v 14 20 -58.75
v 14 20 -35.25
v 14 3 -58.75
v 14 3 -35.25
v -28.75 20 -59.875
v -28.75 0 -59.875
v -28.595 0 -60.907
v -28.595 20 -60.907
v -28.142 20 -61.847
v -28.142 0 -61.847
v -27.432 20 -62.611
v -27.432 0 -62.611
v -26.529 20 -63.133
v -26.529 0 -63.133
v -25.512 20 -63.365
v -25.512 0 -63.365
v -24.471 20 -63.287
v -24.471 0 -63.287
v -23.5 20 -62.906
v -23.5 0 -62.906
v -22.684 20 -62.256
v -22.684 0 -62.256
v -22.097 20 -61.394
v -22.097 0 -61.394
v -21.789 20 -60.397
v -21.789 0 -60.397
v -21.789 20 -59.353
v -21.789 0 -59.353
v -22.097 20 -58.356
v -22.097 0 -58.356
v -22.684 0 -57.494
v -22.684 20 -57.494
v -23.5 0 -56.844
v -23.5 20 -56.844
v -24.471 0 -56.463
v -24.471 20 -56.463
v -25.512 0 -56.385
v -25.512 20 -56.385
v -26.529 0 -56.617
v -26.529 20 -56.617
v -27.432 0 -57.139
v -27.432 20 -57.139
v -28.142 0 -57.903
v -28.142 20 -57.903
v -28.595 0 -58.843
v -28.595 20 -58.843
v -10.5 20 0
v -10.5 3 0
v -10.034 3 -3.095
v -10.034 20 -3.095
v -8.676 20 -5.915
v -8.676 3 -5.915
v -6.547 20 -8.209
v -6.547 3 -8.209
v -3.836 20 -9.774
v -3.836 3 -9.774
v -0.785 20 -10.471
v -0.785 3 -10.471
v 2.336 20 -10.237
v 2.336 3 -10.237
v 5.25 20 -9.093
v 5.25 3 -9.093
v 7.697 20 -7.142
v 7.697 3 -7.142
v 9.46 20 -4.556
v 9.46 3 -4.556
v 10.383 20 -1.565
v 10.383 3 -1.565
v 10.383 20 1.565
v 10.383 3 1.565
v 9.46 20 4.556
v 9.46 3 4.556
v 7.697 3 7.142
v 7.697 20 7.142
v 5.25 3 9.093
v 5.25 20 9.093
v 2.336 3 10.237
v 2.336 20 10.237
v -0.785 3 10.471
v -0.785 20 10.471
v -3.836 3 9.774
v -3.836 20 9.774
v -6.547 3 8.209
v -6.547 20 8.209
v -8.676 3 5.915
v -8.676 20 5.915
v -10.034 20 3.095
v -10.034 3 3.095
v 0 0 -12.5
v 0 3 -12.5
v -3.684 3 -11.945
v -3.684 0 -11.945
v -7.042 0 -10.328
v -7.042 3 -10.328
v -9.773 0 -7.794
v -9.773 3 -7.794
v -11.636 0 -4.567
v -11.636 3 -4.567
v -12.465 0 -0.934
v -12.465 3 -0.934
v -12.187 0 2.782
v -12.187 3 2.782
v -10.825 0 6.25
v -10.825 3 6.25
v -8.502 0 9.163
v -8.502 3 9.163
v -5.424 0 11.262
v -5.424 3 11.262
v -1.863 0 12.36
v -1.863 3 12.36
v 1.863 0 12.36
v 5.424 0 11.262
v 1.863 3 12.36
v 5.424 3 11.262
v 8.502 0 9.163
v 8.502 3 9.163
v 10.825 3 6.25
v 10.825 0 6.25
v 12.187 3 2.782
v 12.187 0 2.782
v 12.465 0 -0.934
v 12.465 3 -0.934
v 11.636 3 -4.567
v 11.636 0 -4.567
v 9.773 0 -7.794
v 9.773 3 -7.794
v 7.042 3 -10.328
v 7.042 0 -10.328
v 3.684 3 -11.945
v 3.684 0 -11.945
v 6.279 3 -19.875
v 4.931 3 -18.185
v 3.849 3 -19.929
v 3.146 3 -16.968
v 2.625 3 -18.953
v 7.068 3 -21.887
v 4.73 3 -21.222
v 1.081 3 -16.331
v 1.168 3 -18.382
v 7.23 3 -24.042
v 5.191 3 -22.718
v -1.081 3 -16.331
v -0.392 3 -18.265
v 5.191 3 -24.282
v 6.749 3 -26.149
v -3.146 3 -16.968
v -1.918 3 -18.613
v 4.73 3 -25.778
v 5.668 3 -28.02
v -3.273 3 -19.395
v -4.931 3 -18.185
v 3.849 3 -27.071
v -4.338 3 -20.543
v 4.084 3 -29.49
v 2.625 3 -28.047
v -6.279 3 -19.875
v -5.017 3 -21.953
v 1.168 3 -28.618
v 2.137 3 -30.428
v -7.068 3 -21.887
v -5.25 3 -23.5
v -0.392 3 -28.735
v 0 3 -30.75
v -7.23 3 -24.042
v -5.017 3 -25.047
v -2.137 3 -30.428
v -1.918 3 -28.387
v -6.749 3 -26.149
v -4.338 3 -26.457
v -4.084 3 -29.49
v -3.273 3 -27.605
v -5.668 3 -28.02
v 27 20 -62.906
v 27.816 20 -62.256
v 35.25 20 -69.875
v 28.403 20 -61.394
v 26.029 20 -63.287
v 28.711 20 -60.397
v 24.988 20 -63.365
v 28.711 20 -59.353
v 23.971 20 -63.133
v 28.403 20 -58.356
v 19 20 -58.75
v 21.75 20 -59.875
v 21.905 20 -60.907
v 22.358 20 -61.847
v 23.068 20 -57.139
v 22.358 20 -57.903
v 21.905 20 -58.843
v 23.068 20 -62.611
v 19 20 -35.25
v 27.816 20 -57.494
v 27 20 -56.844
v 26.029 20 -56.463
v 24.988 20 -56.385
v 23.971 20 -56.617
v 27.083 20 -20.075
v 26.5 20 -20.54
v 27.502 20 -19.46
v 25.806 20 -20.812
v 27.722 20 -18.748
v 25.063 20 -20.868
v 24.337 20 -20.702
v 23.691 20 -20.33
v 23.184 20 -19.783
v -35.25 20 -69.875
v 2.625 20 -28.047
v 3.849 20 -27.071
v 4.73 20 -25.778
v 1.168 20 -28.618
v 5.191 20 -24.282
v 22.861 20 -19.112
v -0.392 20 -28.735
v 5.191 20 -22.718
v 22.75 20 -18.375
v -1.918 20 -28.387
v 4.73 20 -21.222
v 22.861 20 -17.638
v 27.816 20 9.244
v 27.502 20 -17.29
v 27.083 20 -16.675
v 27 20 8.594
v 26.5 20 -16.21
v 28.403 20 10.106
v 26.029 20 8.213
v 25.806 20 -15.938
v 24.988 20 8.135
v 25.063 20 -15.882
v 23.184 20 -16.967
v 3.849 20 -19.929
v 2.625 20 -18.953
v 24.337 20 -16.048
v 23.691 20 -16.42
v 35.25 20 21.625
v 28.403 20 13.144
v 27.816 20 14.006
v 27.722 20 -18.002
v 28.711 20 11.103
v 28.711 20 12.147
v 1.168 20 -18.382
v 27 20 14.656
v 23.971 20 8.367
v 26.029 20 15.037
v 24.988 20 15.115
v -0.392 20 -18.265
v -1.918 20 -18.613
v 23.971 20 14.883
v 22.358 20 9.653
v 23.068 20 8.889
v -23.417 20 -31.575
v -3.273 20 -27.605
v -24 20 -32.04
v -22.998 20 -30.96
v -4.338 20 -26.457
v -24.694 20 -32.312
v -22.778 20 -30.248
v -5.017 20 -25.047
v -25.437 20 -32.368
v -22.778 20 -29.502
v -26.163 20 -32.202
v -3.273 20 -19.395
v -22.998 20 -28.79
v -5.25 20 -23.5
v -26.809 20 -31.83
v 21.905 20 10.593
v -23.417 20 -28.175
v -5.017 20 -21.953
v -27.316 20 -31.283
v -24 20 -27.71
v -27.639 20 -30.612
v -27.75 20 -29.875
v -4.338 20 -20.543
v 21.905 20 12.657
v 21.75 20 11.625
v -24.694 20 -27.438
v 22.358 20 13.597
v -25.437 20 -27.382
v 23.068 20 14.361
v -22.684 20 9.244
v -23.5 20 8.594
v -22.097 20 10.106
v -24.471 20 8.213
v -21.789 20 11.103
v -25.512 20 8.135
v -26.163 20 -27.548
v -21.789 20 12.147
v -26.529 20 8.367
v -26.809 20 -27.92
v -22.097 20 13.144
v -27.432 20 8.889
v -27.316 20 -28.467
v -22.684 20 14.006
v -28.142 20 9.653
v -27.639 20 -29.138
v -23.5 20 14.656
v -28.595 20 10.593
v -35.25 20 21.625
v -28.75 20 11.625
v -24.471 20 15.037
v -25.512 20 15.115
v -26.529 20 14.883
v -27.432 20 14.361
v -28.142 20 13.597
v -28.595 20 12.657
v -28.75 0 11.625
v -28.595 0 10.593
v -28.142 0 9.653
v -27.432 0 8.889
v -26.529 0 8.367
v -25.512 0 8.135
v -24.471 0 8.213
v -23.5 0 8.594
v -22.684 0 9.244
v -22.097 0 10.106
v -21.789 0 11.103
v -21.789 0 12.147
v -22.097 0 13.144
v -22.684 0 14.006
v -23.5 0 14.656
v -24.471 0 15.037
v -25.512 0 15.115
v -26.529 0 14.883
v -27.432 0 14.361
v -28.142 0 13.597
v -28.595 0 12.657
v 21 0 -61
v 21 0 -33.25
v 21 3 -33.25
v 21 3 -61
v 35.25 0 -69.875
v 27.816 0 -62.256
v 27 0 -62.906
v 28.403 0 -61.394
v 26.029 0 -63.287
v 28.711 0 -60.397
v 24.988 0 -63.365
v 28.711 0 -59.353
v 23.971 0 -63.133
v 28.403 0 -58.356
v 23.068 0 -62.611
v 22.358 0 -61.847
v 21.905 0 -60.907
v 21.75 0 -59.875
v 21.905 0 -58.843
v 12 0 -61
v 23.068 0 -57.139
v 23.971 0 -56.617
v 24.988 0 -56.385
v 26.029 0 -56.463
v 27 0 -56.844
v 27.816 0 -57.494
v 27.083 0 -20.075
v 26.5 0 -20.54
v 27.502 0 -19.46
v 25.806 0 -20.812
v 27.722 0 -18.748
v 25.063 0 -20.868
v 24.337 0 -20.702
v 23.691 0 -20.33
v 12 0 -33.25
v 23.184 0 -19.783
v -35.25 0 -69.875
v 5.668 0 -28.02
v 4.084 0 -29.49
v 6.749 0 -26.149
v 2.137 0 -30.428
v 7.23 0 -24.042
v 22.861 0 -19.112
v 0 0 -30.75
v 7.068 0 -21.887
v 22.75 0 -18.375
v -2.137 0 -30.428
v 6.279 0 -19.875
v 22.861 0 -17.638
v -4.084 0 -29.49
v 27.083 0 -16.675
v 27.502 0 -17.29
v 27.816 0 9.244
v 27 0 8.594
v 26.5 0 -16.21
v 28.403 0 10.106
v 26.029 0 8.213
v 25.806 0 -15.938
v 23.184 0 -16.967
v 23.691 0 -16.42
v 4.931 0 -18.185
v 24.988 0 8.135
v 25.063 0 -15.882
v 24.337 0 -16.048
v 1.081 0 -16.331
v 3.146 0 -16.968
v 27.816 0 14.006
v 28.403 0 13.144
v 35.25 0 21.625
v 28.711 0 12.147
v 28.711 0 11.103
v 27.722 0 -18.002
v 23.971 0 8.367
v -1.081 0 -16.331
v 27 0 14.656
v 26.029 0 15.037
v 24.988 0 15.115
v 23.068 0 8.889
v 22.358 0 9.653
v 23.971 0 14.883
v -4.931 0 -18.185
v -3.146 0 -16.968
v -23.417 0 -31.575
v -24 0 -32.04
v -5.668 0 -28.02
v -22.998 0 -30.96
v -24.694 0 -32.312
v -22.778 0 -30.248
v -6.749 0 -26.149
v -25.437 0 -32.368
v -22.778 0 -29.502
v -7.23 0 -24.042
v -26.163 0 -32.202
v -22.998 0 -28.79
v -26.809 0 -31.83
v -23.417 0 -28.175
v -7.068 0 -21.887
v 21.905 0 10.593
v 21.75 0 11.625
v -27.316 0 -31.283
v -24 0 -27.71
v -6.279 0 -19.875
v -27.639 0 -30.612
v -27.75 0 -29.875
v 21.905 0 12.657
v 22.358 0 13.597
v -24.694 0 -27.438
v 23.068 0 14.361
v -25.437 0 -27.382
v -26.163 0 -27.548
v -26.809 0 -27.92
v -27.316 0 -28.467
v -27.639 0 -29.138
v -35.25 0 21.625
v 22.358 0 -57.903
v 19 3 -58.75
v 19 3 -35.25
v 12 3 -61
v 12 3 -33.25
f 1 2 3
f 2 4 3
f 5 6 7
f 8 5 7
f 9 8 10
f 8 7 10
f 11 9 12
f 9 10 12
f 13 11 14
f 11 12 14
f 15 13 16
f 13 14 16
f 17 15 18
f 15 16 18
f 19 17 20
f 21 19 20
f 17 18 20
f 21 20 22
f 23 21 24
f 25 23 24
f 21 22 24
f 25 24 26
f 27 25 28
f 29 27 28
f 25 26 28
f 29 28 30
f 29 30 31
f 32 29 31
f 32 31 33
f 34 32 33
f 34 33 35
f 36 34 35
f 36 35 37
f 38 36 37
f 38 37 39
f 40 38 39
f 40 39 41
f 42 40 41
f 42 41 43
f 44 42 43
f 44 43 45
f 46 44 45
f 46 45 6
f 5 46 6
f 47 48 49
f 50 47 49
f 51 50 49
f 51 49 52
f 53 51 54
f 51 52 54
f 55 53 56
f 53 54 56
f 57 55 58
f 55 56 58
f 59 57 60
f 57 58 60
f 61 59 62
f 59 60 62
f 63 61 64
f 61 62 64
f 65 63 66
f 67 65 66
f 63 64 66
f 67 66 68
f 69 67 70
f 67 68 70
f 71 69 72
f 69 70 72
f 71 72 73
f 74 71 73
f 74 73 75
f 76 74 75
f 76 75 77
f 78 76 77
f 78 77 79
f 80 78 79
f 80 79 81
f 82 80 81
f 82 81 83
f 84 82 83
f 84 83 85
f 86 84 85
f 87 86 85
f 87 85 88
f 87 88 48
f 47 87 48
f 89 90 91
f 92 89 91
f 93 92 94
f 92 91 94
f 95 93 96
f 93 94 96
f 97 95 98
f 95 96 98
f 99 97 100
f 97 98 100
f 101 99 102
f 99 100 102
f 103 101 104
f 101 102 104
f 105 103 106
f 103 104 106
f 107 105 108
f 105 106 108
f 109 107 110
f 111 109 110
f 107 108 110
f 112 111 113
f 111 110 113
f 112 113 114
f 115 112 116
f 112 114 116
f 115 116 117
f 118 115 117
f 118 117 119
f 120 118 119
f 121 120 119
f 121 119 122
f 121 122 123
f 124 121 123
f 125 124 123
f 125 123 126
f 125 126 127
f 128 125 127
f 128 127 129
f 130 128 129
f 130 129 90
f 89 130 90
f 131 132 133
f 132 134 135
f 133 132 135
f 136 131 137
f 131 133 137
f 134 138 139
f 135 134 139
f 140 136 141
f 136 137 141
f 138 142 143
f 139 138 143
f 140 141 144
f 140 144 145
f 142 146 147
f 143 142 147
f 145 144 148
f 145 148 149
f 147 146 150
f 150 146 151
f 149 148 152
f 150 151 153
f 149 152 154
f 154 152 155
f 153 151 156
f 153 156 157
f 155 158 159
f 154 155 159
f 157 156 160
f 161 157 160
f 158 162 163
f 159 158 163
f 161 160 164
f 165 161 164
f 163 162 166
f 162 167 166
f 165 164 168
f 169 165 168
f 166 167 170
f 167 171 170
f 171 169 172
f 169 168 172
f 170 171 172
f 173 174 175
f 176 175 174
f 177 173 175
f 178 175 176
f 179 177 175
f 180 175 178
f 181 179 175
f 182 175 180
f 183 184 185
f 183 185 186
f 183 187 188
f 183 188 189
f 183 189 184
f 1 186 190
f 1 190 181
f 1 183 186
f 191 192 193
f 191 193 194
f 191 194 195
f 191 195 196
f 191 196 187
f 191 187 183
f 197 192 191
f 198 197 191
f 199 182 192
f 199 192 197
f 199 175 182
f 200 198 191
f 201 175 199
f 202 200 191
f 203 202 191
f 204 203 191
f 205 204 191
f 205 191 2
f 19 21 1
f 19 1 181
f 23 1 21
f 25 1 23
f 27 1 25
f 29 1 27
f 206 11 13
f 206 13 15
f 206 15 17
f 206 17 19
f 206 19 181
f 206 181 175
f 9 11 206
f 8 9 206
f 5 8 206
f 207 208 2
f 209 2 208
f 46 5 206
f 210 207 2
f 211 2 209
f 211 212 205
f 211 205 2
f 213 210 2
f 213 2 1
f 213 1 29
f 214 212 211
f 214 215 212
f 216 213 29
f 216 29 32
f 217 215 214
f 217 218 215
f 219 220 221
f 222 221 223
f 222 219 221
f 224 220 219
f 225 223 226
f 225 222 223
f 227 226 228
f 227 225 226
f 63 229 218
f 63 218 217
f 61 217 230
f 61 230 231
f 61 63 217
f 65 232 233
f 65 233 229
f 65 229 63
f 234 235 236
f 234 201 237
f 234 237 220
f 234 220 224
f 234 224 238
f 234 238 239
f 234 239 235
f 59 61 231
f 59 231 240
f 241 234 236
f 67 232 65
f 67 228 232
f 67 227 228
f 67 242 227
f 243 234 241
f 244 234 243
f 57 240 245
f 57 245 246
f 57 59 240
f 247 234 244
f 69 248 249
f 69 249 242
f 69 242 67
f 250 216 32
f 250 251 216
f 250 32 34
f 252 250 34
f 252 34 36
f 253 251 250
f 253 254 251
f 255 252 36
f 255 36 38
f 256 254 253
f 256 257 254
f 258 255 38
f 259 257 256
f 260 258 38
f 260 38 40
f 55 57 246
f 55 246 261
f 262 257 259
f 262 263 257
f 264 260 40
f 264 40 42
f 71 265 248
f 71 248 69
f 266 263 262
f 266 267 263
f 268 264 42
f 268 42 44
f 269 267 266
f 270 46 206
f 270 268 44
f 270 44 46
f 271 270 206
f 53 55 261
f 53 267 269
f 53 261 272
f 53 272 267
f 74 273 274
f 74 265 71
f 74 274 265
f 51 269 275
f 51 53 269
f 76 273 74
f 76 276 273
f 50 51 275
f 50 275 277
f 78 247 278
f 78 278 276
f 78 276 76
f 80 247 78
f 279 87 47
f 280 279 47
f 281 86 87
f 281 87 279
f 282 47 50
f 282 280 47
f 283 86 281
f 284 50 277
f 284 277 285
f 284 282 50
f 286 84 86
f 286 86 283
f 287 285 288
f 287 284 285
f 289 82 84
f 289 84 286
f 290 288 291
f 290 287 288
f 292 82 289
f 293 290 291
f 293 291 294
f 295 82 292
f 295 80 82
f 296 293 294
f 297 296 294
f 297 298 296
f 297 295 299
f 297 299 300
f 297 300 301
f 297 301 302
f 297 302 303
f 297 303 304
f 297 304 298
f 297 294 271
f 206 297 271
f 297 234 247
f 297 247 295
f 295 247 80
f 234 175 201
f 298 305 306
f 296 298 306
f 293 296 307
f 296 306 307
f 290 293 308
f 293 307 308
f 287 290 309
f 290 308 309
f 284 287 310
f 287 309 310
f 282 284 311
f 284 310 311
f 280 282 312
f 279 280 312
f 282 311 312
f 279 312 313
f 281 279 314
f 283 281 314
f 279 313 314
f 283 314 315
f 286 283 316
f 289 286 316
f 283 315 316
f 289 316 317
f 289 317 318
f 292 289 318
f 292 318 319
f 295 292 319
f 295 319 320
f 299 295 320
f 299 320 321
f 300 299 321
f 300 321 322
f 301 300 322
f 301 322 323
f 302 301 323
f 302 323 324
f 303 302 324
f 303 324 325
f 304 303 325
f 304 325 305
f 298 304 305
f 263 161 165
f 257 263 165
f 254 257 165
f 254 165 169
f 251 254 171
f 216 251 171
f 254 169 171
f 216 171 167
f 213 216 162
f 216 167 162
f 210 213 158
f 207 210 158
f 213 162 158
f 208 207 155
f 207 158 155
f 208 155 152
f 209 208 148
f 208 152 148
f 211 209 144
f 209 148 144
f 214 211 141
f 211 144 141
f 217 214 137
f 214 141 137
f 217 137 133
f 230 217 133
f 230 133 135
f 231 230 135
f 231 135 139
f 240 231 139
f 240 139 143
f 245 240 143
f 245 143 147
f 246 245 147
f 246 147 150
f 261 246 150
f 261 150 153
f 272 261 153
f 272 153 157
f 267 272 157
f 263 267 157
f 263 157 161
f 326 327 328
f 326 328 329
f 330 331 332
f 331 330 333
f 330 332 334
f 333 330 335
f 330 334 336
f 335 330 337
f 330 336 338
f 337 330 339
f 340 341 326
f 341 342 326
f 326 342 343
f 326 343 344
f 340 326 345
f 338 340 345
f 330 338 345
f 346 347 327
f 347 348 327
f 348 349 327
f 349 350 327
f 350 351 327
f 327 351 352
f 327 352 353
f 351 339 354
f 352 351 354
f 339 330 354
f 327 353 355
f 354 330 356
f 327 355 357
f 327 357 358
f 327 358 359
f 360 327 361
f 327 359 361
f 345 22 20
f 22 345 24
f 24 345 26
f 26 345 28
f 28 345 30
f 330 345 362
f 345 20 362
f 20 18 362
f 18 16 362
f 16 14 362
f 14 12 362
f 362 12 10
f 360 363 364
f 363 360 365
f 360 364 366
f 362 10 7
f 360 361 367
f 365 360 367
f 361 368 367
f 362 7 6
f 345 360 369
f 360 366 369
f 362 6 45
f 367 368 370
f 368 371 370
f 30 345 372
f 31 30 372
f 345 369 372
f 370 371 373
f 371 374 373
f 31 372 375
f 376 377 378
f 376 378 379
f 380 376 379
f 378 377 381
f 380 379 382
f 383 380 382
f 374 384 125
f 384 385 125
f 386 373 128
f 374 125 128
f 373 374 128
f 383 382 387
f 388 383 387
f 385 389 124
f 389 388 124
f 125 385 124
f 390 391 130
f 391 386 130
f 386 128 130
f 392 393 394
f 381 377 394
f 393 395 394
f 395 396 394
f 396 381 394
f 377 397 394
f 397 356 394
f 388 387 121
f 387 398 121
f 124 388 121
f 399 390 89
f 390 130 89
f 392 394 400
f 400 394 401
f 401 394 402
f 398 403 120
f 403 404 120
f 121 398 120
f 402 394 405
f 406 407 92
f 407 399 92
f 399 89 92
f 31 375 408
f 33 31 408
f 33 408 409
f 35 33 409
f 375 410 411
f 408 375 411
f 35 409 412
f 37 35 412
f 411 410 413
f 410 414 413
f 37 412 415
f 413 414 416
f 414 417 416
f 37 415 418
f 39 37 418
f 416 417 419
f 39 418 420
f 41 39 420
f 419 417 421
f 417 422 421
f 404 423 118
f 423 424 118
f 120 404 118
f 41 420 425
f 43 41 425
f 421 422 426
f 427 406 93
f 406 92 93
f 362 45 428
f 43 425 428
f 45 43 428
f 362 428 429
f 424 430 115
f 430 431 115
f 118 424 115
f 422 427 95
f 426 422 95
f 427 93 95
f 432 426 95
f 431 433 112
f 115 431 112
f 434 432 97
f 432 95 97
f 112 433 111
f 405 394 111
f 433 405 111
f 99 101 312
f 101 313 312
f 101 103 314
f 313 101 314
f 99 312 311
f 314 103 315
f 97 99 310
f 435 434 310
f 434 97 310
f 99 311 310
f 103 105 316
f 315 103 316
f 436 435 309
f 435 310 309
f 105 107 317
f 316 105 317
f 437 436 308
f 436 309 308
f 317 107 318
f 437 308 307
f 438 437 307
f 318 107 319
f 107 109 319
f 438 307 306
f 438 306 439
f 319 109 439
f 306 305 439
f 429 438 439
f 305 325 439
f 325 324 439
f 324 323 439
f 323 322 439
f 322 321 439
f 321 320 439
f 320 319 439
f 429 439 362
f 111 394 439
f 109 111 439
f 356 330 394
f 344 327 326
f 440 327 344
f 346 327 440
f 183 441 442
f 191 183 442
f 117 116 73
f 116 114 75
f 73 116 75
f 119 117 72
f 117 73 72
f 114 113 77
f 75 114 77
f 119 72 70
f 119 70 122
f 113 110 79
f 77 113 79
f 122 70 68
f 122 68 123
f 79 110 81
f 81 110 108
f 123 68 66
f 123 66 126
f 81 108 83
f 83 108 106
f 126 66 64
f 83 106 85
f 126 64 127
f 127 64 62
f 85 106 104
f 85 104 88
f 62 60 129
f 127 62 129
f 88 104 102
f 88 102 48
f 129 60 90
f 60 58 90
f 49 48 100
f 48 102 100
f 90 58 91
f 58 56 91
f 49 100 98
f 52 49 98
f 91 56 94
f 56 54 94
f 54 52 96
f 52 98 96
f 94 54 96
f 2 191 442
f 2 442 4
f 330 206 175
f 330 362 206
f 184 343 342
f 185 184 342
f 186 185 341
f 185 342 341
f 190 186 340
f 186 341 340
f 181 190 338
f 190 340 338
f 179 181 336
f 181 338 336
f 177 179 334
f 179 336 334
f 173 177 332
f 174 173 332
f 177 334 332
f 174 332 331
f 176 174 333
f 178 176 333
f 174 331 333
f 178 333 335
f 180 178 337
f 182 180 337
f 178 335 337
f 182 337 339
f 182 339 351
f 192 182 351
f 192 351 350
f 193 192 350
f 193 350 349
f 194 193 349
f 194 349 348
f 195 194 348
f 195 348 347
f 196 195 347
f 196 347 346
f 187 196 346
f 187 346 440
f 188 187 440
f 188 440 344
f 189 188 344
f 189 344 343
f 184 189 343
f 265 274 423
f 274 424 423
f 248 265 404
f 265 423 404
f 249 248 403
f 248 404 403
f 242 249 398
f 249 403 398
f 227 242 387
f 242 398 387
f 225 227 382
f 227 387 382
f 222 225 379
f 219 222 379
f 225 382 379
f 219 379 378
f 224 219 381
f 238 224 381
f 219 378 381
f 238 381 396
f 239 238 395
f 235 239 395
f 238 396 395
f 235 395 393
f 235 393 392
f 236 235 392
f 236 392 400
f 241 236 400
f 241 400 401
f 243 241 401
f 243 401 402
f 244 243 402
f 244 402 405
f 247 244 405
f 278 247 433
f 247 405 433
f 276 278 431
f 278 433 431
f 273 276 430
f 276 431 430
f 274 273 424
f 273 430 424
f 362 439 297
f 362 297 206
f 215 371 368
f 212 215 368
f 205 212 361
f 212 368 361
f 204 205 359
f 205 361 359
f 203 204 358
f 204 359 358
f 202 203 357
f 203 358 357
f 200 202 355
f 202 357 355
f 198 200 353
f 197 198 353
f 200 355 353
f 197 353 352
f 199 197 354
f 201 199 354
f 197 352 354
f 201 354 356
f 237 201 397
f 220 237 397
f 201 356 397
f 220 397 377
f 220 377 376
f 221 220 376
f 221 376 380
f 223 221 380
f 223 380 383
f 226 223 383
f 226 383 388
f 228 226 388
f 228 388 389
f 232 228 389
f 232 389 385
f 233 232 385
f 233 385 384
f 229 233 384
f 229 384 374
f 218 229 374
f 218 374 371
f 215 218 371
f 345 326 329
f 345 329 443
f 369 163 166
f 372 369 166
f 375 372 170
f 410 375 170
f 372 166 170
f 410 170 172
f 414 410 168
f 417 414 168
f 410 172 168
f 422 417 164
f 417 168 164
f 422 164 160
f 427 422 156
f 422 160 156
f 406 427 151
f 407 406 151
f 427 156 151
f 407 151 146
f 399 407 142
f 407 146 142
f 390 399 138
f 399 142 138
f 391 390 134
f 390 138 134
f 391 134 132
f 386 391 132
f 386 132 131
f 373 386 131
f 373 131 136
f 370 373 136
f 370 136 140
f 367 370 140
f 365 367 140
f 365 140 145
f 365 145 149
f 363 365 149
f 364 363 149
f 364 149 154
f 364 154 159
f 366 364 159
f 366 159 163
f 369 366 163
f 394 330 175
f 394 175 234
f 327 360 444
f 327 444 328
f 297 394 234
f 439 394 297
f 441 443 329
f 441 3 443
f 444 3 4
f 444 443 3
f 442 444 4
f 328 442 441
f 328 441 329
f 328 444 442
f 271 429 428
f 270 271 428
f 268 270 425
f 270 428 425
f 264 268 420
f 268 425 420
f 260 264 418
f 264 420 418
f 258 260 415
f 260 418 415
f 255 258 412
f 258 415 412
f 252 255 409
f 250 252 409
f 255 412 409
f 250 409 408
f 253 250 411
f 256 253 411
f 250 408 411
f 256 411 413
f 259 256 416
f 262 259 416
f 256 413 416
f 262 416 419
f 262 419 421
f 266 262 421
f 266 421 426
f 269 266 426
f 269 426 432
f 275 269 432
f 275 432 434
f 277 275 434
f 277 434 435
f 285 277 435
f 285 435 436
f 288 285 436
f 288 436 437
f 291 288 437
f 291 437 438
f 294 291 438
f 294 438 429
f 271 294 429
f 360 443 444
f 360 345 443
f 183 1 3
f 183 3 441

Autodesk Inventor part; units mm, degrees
ref_plane "YZ Plane" through (0, 0, 0) normal (1, 0, 0) x (0, 1, 0)
ref_plane "XZ Plane" through (0, 0, 0) normal (0, 1, 0) x (-1, 0, 0)
ref_plane "XY Plane" through (0, 0, 0) normal (0, 0, 1) x (1, 0, 0)
sketch "Sketch1" plane through (0, 0, 0) normal (0, 1, 0) x (-1, 0, 0)
  circle A0 centre (0, 0) radius 10.5
  line L0 (0, 0) -> (0, -23.5)
  circle A1 centre (0, -23.5) radius 5.25
  line L1 (0, -23.5) -> (0, -35.25)
  line L2 (-14, -35.25) -> (-14, -58.75)
  line L3 (-14, -58.75) -> (-19, -58.75)
  line L4 (-19, -58.75) -> (-19, -35.25)
  line L5 (-35.25, 21.625) -> (35.25, 21.625)
  line L6 (-35.25, 21.625) -> (35.25, 21.625) construction
  line L7 (35.25, 21.625) -> (25.25, 21.625)
  line L8 (-35.25, 21.625) -> (35.25, 21.625)
  line L9 (35.25, 21.625) -> (35.25, -69.875)
  line L10 (35.25, -69.875) -> (-35.25, -69.875)
  line L11 (-35.25, -69.875) -> (-35.25, 21.625)
  line L12 (-35.25, 21.625) -> (-35.25, 11.625)
  line L13 (-35.25, 11.625) -> (-25.25, 11.625)
  circle A2 centre (-25.25, 11.625) radius 3.5
  line L14 (35.25, 21.625) -> (25.25, 21.625)
  line L15 (25.25, 21.625) -> (25.25, 11.625)
  circle A3 centre (25.25, 11.625) radius 3.5
  line L16 (35.25, -69.875) -> (25.25, -69.875)
  line L17 (25.25, -69.875) -> (25.25, -59.875)
  circle A4 centre (25.25, -59.875) radius 3.5
  line L18 (-35.25, -69.875) -> (-25.25, -69.875)
  line L19 (-25.25, -69.875) -> (-25.25, -59.875)
  circle A5 centre (-25.25, -59.875) radius 3.5
  line L20 (-25.25, 11.625) -> (-25.25, -18.375)
  line L21 (25.25, -59.875) -> (25.25, -29.875)
  circle A6 centre (-25.25, -18.375) radius 2.5
  circle A7 centre (25.25, -29.875) radius 2.5
  line L22 (-19, -35.25) -> (-14, -35.25)
  dimension "d0" = 21
  dimension "d1" = 23.5
  dimension "d2" = 10.5
  dimension "d3" = 11.75
  dimension "d5" = 23.5
  dimension "d6" = 5
  dimension "d7" = 23.5
  dimension "d9" = 70.5
  dimension "d40" = 21.625
  dimension "d41" = 70.5
  dimension "d42" = 91.5
  dimension "d43" = 10
  dimension "d44" = 10
  dimension "d45" = 7
  dimension "d46" = 10
  dimension "d47" = 10
  dimension "d48" = 90
  dimension "d50" = 7
  dimension "d51" = 10
  dimension "d52" = 10
  dimension "d53" = 7
  dimension "d54" = 10
  dimension "d55" = 10
  dimension "d56" = 7
  dimension "d60" = 30
  dimension "d61" = 30
  dimension "d62" = 5
  dimension "d63" = 5
  dimension "d64" = 14
extrude "Extrusion1" add sketch "Sketch1" along normal blind 20
hole "Hole1" at (0, 0, 0) direction (0, 1, 0) diameter 3 end through all counterbore diameter 25 counterbore depth 3
hole "Hole2" at (0, 0, -23.5) direction (0, 1, 0) diameter 3 end through all counterbore diameter 14.5 counterbore depth 3
sketch "Sketch2" plane through (0, 0, 0) normal (0, -1, 0) x (1, 0, 0)
  line L0 (12, -33.25) -> (21, -33.25)
  line L1 (21, -33.25) -> (21, -61)
  line L2 (21, -61) -> (12, -61)
  line L3 (12, -61) -> (12, -33.25)
  point P0 (0, 0)
  dimension "d85" = 33.25
  dimension "d86" = 12
  dimension "d87" = 9
  dimension "d88" = 27.75
extrude "Extrusion2" cut sketch "Sketch2" against normal blind 3
properties part number "Guia"
